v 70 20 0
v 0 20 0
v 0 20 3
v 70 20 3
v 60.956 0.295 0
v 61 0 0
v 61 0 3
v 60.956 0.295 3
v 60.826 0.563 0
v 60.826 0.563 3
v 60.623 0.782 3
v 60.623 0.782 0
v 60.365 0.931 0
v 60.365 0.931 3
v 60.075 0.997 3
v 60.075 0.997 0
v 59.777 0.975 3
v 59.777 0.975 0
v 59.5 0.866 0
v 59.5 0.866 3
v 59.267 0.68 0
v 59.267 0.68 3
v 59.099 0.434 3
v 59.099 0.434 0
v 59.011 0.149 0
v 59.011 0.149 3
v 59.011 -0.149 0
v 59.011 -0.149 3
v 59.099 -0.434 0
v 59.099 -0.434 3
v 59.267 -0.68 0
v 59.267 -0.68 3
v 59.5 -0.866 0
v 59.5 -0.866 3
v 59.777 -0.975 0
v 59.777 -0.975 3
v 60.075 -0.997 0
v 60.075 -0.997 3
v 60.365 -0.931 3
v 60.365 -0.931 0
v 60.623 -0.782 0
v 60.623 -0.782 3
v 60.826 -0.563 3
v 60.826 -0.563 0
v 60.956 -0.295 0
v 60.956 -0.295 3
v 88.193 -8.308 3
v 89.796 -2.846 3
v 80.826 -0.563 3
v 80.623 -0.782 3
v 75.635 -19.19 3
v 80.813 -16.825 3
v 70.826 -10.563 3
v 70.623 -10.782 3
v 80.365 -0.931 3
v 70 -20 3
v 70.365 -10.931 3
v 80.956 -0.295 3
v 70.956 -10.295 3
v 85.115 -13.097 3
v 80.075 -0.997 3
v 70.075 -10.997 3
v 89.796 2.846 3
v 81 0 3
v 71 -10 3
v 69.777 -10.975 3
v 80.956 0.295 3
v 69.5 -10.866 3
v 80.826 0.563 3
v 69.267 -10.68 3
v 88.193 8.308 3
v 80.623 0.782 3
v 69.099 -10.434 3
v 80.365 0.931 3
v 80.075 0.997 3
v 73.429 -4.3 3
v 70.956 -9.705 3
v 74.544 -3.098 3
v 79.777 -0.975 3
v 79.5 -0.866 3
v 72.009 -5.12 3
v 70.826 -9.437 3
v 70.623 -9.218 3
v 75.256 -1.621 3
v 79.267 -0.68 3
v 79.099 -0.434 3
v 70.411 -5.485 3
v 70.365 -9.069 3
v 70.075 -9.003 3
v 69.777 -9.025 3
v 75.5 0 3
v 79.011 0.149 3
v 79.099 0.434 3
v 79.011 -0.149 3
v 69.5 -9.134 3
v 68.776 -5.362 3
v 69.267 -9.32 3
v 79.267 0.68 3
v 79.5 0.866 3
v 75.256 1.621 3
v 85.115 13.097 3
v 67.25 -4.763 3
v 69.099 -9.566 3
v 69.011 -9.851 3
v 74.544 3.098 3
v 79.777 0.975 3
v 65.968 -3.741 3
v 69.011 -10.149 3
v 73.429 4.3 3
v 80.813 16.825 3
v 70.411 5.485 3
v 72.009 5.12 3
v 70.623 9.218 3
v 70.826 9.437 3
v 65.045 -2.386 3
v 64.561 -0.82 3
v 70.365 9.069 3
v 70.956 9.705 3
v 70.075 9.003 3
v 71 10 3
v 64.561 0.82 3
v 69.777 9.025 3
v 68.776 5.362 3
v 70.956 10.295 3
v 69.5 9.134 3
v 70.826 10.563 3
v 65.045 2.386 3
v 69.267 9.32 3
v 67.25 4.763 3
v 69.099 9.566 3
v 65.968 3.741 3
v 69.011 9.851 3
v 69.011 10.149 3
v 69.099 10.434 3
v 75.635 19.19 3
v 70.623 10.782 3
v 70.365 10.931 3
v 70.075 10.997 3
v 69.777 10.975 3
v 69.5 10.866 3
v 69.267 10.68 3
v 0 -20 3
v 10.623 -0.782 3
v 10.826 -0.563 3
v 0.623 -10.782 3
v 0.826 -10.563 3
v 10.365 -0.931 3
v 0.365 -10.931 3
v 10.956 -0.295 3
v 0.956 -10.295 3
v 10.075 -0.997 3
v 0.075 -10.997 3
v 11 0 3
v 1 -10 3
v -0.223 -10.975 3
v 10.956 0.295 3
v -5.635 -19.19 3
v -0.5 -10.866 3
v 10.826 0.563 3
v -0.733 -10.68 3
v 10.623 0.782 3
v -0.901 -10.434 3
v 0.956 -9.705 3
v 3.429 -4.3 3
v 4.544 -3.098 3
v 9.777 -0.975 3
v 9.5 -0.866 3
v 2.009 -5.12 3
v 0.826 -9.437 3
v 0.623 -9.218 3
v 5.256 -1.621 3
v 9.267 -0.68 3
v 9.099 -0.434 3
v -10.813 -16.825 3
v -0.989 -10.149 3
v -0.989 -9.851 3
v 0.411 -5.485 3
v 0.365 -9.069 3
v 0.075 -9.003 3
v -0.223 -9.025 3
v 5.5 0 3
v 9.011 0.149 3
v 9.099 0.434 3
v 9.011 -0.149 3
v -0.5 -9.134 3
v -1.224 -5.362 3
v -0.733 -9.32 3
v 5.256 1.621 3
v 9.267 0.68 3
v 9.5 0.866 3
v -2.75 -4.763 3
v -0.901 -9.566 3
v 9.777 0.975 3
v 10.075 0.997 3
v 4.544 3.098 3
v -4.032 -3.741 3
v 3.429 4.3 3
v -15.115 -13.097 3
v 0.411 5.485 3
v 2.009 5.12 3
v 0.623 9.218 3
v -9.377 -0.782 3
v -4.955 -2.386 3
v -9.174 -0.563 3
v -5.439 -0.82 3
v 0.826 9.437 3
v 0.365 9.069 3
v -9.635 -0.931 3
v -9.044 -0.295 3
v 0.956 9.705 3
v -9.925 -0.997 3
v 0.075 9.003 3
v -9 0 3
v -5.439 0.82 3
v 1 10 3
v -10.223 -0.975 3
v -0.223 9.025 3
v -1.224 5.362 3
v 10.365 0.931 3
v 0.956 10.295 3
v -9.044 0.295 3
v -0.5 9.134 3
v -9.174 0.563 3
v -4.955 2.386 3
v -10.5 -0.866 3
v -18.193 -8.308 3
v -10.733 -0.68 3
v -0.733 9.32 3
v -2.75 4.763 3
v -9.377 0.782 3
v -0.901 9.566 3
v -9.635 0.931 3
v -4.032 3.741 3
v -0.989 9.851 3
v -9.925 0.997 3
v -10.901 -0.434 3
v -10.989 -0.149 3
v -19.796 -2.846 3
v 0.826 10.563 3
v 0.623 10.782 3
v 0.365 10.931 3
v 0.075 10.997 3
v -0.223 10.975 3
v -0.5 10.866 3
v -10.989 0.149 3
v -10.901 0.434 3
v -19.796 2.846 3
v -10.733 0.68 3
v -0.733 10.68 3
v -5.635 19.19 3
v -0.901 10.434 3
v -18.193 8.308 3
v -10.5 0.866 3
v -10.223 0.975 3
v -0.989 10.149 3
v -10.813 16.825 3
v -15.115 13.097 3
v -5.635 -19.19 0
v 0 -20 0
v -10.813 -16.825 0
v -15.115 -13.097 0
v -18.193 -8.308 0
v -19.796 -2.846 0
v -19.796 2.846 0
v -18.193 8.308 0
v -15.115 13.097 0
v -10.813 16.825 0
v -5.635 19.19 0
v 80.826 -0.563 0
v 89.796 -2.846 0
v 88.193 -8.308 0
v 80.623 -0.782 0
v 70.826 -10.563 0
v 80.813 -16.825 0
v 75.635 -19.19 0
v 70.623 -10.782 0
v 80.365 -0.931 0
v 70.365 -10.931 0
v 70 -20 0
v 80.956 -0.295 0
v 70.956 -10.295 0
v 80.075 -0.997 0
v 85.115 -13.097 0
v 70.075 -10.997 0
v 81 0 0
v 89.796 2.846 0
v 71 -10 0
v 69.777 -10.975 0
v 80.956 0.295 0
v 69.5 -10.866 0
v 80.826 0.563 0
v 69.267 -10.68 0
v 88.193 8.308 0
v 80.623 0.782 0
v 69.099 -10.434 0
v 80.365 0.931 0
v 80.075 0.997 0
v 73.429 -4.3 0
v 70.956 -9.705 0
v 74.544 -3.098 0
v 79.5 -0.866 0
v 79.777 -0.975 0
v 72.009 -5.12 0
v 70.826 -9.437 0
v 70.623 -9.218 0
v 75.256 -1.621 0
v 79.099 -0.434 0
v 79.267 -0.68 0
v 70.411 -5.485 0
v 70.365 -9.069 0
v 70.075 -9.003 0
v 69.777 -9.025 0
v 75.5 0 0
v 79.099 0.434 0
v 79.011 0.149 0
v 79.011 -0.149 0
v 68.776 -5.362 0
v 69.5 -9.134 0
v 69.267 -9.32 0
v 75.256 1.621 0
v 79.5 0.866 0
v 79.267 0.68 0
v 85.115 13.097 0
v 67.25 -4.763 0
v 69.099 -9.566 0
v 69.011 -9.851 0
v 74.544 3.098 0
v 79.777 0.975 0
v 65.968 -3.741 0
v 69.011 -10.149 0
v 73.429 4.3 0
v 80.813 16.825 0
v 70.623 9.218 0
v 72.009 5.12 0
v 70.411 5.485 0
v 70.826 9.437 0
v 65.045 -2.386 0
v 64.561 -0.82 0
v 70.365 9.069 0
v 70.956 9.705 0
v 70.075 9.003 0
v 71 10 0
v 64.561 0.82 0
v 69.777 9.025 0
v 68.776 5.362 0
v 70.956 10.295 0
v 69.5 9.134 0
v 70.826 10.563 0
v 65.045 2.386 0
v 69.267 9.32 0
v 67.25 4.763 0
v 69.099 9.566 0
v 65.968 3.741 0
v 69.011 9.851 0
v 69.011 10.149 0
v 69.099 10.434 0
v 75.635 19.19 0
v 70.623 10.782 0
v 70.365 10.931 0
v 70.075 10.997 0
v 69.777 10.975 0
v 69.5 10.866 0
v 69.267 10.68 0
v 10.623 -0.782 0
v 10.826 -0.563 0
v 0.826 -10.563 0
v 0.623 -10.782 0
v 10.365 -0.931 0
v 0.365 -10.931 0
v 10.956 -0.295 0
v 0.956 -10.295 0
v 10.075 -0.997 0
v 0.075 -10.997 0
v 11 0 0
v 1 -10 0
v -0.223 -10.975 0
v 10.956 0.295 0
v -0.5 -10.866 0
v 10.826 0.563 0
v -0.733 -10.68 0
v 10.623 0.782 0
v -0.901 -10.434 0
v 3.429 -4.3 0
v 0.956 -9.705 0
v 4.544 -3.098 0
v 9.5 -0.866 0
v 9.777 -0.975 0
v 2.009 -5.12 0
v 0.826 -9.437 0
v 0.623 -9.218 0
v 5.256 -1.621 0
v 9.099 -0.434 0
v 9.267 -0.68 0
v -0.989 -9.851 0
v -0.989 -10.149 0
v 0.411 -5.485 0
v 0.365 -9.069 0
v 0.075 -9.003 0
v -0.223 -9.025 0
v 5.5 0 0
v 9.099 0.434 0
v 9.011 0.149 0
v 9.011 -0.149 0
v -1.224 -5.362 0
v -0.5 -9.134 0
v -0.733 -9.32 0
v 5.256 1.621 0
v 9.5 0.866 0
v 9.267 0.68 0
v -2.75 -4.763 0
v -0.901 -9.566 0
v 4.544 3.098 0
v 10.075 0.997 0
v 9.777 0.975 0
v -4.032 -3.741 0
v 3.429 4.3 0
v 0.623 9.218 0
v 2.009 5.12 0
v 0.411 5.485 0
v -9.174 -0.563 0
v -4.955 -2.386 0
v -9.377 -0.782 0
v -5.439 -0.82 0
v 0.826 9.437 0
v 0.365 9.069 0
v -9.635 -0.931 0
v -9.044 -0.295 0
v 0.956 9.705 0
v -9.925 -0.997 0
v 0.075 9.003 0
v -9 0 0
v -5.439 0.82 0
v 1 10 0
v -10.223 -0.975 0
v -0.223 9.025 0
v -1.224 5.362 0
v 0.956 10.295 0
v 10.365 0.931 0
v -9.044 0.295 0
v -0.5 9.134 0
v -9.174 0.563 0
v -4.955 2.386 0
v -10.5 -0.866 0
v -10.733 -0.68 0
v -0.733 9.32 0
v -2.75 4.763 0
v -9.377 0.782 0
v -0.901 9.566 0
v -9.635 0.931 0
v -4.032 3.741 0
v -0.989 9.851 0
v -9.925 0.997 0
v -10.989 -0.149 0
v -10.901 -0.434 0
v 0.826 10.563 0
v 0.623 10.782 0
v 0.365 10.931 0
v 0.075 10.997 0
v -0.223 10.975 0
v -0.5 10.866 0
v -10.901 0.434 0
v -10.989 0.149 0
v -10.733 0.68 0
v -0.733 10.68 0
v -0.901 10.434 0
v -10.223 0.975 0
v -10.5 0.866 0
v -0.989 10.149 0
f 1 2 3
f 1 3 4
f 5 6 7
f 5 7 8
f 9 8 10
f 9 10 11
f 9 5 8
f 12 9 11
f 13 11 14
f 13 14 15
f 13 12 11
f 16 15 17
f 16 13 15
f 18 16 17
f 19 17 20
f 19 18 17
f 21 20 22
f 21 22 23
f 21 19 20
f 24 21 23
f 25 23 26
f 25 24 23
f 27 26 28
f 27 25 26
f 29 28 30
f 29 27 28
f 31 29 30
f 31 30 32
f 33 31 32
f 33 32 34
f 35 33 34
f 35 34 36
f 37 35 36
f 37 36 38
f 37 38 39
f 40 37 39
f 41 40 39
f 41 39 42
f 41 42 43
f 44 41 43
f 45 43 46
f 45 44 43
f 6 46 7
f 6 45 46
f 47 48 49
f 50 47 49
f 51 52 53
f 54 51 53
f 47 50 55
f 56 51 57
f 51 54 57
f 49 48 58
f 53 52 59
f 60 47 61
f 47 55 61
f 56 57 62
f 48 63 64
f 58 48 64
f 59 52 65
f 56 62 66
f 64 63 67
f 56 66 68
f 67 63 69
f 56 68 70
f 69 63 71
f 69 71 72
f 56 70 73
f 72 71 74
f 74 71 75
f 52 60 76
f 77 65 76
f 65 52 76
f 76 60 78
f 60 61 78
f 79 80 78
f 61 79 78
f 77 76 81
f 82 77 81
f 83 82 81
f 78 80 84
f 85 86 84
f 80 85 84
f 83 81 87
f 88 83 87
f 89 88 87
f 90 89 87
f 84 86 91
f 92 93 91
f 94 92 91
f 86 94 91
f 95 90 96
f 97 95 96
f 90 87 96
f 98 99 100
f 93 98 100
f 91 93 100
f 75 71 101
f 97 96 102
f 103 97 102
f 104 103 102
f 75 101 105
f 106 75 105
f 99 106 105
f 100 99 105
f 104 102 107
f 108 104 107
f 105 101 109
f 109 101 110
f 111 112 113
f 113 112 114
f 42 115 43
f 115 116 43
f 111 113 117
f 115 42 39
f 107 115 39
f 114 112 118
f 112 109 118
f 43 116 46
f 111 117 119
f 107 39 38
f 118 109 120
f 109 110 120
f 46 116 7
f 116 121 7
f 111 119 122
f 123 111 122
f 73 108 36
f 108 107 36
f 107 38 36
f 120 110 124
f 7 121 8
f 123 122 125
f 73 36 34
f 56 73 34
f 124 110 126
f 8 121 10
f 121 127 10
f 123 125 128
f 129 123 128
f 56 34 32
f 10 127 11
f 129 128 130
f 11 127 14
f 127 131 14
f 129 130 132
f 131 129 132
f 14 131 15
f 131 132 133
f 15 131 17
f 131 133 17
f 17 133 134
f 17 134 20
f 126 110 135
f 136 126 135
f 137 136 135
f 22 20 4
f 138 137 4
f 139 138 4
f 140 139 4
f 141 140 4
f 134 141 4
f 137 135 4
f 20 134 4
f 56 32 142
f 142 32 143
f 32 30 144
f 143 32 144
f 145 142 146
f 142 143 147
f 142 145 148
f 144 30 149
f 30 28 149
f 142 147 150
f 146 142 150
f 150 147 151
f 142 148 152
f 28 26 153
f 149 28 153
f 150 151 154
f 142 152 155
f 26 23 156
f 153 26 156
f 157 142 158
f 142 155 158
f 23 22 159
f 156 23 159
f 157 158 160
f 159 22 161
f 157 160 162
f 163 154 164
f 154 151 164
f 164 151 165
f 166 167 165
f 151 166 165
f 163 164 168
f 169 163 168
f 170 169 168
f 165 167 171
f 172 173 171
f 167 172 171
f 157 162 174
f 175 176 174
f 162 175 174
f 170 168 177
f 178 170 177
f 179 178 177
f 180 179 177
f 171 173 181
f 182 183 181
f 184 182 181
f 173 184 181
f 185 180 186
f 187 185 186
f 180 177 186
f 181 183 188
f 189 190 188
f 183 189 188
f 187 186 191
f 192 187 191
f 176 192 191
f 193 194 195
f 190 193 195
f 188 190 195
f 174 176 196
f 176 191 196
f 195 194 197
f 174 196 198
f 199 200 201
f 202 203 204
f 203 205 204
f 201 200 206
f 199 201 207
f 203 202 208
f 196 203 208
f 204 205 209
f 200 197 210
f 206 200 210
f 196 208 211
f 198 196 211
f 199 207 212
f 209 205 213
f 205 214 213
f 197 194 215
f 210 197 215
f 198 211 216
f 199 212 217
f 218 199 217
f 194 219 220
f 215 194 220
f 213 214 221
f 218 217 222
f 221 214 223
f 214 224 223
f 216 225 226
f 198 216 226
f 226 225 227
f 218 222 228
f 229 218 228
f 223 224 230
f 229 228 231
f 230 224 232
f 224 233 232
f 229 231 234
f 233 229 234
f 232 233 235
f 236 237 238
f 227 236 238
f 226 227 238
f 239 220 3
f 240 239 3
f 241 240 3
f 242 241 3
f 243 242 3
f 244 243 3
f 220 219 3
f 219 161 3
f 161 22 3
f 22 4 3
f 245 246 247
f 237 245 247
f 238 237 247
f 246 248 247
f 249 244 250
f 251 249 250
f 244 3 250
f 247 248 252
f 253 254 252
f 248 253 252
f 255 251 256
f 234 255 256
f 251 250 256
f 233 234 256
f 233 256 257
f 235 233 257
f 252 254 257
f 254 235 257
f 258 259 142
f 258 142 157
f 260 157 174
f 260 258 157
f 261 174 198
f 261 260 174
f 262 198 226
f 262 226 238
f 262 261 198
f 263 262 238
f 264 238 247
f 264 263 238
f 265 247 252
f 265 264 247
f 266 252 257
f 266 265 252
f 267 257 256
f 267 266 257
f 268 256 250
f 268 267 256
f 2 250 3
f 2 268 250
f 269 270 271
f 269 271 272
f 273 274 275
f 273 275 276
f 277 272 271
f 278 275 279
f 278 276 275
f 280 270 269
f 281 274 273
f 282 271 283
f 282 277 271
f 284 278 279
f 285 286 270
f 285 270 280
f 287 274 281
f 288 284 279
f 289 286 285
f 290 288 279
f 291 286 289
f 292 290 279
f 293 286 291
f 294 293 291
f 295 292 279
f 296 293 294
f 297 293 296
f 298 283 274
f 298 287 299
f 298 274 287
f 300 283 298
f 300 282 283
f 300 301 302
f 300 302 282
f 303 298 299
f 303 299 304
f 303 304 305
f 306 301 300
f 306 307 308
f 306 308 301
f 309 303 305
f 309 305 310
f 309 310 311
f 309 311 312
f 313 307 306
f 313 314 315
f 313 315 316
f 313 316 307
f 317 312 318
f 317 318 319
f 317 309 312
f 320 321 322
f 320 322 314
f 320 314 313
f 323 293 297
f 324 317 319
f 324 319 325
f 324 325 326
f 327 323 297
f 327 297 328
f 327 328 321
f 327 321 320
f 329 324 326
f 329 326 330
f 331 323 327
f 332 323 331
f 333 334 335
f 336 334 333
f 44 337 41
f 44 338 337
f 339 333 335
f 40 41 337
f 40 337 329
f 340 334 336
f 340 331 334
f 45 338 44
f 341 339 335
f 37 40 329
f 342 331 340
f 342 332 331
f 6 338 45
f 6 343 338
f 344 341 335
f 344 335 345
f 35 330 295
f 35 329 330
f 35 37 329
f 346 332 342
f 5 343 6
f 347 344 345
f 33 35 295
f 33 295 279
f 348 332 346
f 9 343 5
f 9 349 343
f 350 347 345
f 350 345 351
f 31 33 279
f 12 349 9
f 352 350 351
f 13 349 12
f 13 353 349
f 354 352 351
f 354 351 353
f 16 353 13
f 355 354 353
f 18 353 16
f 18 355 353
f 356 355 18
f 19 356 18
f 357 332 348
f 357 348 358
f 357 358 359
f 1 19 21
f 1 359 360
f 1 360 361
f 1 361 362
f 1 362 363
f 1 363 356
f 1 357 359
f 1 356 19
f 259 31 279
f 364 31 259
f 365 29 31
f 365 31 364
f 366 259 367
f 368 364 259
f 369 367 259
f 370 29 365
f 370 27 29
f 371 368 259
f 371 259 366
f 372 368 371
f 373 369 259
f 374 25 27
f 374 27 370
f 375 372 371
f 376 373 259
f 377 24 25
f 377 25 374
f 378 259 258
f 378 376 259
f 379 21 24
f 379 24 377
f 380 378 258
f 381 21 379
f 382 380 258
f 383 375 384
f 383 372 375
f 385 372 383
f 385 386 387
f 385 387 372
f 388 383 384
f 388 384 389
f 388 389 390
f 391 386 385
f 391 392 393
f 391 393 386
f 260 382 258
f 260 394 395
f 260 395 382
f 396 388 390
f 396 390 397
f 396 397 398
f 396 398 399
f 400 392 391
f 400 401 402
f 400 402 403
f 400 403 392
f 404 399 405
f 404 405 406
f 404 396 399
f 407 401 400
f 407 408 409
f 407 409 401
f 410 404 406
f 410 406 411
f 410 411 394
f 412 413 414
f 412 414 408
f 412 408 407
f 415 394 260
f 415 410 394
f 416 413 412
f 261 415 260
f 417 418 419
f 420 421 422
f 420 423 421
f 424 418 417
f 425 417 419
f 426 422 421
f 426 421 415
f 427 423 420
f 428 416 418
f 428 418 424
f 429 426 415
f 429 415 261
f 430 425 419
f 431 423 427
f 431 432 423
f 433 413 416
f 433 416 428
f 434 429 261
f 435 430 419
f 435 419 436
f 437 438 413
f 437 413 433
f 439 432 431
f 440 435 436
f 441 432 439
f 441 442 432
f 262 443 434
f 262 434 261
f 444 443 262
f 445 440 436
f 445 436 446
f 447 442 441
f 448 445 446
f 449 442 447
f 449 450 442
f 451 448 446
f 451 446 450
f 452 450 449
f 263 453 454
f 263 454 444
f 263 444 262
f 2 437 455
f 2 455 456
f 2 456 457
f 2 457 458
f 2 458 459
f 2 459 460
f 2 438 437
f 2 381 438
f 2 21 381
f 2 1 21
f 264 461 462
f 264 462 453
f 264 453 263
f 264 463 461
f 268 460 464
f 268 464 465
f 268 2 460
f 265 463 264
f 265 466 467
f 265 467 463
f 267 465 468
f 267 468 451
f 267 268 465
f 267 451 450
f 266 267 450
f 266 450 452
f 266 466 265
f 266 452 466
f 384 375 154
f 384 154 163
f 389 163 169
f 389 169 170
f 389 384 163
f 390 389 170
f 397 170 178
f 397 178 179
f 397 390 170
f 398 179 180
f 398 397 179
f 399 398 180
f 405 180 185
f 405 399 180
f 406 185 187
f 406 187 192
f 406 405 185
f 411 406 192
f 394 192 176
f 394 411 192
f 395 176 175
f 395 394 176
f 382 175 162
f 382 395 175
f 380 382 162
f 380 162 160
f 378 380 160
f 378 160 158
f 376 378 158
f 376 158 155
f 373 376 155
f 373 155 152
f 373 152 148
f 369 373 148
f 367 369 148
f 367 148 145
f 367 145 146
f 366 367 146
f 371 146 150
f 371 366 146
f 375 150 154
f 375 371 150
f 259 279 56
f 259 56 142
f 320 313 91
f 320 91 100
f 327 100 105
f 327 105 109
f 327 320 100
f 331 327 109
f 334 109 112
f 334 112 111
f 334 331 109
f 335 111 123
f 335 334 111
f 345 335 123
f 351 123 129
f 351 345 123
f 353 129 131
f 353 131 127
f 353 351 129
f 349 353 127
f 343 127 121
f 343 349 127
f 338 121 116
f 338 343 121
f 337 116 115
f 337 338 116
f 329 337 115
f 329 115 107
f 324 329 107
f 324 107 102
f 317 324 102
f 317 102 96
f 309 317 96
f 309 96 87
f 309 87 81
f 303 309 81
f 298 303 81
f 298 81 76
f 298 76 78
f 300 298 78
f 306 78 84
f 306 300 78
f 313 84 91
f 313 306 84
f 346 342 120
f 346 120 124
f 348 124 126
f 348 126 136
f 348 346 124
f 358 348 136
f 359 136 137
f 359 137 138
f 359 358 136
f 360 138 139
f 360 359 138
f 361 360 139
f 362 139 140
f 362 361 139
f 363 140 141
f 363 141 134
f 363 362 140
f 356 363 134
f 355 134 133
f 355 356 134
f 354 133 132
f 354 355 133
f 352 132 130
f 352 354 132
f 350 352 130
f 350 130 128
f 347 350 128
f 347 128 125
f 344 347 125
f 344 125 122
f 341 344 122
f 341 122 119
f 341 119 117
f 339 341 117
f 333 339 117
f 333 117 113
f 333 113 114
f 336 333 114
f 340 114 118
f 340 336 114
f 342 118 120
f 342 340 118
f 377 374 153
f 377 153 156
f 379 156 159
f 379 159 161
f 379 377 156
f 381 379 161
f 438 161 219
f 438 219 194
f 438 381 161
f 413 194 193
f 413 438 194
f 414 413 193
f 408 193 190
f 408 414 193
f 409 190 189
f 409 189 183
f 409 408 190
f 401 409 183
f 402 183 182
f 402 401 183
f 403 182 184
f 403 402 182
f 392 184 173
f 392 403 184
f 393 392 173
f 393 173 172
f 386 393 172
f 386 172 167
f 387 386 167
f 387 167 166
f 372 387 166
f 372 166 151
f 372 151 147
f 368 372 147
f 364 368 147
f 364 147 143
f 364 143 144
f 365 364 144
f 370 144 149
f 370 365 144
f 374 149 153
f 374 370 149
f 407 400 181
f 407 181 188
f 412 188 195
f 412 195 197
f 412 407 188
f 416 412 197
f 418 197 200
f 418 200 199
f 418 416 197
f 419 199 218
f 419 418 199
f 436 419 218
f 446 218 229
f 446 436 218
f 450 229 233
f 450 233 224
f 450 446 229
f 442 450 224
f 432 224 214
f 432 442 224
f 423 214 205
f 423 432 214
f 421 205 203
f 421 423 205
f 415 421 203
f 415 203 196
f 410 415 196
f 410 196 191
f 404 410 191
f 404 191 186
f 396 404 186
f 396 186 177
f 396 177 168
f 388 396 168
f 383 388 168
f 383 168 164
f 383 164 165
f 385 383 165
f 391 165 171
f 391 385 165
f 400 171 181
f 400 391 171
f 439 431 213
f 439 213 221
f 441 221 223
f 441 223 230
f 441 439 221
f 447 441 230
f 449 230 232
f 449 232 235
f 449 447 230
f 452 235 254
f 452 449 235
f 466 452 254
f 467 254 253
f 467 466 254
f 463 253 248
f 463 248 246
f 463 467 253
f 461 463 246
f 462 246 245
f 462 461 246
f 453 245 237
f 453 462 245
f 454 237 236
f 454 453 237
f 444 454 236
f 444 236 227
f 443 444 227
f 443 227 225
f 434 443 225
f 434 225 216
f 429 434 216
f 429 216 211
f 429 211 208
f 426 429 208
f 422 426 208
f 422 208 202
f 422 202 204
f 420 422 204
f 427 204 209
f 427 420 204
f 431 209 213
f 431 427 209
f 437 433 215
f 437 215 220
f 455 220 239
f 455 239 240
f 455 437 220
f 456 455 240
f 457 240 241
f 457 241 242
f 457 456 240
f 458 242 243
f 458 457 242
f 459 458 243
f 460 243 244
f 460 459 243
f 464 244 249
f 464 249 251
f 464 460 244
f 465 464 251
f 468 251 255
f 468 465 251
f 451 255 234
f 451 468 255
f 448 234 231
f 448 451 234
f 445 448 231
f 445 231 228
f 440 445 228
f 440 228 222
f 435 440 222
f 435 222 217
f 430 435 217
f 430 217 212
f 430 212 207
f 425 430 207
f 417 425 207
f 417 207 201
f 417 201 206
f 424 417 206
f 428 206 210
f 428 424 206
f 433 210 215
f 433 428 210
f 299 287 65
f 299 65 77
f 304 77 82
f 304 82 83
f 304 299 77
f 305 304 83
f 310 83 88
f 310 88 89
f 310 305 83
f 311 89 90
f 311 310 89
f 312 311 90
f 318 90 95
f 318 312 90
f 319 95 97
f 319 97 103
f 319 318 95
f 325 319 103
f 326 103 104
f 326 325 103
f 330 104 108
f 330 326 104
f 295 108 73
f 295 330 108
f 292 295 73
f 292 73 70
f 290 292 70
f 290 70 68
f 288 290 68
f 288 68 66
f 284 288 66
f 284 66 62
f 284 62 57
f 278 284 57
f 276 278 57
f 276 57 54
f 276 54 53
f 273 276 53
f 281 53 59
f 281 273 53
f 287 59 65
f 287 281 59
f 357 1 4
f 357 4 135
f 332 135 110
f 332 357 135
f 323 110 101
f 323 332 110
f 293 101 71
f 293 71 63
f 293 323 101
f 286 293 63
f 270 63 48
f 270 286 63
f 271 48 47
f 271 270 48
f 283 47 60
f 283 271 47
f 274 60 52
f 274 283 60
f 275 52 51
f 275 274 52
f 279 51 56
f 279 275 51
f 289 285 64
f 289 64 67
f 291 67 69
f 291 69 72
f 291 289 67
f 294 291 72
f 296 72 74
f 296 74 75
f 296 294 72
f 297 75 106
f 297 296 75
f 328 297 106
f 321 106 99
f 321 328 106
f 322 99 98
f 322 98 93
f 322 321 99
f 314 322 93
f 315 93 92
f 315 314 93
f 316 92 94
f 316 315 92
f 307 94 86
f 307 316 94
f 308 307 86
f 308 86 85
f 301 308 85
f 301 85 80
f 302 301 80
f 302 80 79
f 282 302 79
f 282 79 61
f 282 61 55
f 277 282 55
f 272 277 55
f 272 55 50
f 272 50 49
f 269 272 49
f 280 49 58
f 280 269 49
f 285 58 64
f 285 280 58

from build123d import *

# Parameters (mm, degrees)
SKETCH1_R           = 1
SKETCH1_R_2         = 5.5
BOSS_EXTRUDE1_DEPTH = 3


with BuildPart() as part:
    # Sketch1 → Boss-Extrude1 (new body)
    with BuildSketch(Plane.XY):
        with BuildLine():
            Line((0, 20), (70, 20))
            ThreePointArc((70, 20), (90, 0), (70, -20))
            Line((70, -20), (0, -20))
            ThreePointArc((0, -20), (-20, 0), (0, 20))
        make_face()
        with Locations((10, 0)):
            Circle(SKETCH1_R, mode=Mode.SUBTRACT)
        with Locations((0, -10)):
            Circle(SKETCH1_R, mode=Mode.SUBTRACT)
        with Locations((-10, 0)):
            Circle(SKETCH1_R, mode=Mode.SUBTRACT)
        with Locations((0, 10)):
            Circle(SKETCH1_R, mode=Mode.SUBTRACT)
        with Locations((80, 0)):
            Circle(SKETCH1_R, mode=Mode.SUBTRACT)
        with Locations((60, 0)):
            Circle(SKETCH1_R, mode=Mode.SUBTRACT)
        with Locations((70, 10)):
            Circle(SKETCH1_R, mode=Mode.SUBTRACT)
        with Locations((70, -10)):
            Circle(SKETCH1_R, mode=Mode.SUBTRACT)
        Circle(SKETCH1_R_2, mode=Mode.SUBTRACT)
        with Locations((70, 0)):
            Circle(SKETCH1_R_2, mode=Mode.SUBTRACT)
    extrude(amount=BOSS_EXTRUDE1_DEPTH)


solid = part.part
